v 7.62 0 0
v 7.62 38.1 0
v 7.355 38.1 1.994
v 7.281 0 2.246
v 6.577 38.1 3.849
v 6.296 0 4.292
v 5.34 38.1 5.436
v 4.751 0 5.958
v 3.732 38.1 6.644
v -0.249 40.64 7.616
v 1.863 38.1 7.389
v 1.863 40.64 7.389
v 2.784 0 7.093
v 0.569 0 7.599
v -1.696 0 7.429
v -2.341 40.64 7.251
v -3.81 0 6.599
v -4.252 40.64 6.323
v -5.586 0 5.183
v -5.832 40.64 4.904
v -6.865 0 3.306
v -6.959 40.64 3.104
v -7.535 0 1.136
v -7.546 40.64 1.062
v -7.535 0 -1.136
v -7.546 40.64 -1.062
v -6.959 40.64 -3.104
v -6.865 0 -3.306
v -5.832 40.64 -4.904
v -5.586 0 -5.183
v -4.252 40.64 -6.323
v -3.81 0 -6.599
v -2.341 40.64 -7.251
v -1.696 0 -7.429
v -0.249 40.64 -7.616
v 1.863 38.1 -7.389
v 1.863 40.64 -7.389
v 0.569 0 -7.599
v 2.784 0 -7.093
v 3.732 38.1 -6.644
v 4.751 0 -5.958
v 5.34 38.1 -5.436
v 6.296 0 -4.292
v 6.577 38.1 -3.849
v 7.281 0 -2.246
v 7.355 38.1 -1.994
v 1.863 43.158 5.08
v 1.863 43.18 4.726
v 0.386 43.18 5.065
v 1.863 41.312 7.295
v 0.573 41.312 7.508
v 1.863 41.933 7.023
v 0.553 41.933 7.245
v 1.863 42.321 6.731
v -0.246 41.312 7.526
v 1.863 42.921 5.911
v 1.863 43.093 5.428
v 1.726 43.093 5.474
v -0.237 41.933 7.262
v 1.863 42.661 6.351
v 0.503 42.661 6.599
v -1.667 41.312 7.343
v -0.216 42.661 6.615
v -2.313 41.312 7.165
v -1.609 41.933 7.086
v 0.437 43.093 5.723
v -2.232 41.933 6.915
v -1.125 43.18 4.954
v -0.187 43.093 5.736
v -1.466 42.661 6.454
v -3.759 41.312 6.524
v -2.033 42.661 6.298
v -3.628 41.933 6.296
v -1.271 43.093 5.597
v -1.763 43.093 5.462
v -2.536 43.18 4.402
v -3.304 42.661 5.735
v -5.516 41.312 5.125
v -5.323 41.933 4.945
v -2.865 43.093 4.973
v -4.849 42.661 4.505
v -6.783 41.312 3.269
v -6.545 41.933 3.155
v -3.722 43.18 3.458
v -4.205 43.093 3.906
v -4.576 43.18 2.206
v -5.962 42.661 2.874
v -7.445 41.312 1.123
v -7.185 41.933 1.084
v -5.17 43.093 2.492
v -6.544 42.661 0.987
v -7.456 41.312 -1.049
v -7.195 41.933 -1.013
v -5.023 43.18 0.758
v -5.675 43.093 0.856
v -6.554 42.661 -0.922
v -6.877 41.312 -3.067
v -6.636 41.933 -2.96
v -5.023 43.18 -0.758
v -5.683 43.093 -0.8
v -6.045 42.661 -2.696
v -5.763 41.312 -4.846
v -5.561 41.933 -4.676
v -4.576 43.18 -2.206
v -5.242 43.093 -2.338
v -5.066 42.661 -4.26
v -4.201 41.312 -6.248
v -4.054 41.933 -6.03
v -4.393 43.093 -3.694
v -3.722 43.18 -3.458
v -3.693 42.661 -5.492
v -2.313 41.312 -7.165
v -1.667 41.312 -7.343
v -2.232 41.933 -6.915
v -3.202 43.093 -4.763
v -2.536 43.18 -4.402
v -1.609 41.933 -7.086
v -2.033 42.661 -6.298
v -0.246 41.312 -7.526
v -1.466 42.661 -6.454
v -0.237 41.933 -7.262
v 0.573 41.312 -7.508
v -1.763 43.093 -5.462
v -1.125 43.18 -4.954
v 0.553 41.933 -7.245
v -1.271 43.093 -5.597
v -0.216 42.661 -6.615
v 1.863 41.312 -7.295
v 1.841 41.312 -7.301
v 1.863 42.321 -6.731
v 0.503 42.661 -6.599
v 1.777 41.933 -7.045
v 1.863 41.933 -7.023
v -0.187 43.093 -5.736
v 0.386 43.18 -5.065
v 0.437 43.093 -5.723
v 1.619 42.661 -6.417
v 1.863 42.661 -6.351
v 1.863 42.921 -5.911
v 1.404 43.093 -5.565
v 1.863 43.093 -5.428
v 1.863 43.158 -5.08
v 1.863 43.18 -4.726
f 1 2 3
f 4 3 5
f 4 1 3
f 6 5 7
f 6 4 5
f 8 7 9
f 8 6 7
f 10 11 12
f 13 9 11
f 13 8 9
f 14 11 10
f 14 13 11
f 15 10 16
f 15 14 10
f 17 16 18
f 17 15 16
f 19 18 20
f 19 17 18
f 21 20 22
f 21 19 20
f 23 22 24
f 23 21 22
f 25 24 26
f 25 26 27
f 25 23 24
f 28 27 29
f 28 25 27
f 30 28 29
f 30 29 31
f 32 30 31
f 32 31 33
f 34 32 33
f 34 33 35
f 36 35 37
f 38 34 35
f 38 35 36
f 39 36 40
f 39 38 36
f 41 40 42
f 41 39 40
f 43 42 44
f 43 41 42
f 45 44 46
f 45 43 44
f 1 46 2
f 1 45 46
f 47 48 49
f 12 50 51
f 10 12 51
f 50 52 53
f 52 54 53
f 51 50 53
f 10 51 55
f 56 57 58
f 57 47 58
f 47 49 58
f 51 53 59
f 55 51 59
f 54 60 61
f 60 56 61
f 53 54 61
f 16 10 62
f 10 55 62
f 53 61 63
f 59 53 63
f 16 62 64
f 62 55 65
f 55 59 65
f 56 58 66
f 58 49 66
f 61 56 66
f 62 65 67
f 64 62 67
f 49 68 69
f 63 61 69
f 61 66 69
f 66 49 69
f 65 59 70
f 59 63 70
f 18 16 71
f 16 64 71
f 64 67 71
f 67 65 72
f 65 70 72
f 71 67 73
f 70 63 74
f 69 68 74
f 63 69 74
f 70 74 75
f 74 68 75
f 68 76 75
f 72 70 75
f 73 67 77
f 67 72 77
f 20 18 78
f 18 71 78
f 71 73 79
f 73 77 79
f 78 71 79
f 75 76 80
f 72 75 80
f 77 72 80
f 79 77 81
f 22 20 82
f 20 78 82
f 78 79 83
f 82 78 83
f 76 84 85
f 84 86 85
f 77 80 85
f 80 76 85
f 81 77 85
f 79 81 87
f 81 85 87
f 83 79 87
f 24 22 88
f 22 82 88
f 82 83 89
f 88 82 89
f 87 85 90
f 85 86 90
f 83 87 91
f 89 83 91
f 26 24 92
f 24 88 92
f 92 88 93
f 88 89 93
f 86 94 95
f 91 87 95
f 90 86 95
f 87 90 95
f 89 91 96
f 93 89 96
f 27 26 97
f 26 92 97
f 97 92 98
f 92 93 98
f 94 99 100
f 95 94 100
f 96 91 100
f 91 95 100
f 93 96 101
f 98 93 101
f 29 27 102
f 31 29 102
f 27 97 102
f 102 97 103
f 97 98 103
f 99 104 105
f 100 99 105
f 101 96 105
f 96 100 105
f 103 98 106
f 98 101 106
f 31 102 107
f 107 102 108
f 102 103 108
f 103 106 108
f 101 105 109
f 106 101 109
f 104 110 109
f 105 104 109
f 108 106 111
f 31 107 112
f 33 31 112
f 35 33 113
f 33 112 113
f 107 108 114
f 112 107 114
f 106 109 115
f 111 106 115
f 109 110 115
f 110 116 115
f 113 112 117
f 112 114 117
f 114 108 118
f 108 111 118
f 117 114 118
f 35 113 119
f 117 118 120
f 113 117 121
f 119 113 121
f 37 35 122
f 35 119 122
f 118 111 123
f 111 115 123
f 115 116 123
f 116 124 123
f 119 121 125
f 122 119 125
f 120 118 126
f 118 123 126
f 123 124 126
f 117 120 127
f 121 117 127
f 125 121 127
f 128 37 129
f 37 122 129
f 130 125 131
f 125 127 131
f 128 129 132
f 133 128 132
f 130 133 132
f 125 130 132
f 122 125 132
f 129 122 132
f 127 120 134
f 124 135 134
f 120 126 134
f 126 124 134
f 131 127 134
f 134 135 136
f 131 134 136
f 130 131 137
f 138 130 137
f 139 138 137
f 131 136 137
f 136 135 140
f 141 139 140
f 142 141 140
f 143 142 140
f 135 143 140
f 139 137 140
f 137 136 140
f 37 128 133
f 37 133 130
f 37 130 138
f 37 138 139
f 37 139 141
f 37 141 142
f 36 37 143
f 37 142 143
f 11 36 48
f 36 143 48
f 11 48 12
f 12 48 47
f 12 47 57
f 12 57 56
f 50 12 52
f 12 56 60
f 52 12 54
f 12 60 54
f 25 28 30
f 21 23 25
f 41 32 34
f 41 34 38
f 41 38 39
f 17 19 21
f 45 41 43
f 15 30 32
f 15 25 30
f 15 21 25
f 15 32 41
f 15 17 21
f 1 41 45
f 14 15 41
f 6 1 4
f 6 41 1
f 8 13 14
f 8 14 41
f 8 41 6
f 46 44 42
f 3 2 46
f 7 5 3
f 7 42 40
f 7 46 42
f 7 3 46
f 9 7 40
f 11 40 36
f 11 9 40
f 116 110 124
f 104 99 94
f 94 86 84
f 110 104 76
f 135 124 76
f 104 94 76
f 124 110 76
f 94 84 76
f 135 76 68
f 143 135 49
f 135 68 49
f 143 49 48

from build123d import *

# Parameters (mm, degrees)
F0_R     = 7.62
F1_DEPTH = 43.18
F3_DEPTH = 5.08
F4_R     = 2.54


with BuildPart() as f1:
    # F0 (on Front) → F1 (new body)
    with BuildSketch(Plane.XZ):
        Circle(F0_R)
    extrude(amount=-F1_DEPTH)

    # F2 (on face) → F3 (cut)
    with BuildSketch(Plane(origin=(0, 43.18, 0), x_dir=(-1, 0, 0), z_dir=(0, 1, 0))):
        with BuildLine():
            Line((-1.863431, -7.388642), (-1.863431, 7.388642))
            ThreePointArc((-1.863431, 7.388642), (-7.62, 0), (-1.863431, -7.388642))
        make_face()
    extrude(amount=-F3_DEPTH, mode=Mode.SUBTRACT)

    # F4
    f4_edges = [f1.edges().sort_by_distance(p)[0] for p in [
        (-7.62, 43.18, 0),
    ]]
    fillet(f4_edges, radius=F4_R)


solid = f1.part
